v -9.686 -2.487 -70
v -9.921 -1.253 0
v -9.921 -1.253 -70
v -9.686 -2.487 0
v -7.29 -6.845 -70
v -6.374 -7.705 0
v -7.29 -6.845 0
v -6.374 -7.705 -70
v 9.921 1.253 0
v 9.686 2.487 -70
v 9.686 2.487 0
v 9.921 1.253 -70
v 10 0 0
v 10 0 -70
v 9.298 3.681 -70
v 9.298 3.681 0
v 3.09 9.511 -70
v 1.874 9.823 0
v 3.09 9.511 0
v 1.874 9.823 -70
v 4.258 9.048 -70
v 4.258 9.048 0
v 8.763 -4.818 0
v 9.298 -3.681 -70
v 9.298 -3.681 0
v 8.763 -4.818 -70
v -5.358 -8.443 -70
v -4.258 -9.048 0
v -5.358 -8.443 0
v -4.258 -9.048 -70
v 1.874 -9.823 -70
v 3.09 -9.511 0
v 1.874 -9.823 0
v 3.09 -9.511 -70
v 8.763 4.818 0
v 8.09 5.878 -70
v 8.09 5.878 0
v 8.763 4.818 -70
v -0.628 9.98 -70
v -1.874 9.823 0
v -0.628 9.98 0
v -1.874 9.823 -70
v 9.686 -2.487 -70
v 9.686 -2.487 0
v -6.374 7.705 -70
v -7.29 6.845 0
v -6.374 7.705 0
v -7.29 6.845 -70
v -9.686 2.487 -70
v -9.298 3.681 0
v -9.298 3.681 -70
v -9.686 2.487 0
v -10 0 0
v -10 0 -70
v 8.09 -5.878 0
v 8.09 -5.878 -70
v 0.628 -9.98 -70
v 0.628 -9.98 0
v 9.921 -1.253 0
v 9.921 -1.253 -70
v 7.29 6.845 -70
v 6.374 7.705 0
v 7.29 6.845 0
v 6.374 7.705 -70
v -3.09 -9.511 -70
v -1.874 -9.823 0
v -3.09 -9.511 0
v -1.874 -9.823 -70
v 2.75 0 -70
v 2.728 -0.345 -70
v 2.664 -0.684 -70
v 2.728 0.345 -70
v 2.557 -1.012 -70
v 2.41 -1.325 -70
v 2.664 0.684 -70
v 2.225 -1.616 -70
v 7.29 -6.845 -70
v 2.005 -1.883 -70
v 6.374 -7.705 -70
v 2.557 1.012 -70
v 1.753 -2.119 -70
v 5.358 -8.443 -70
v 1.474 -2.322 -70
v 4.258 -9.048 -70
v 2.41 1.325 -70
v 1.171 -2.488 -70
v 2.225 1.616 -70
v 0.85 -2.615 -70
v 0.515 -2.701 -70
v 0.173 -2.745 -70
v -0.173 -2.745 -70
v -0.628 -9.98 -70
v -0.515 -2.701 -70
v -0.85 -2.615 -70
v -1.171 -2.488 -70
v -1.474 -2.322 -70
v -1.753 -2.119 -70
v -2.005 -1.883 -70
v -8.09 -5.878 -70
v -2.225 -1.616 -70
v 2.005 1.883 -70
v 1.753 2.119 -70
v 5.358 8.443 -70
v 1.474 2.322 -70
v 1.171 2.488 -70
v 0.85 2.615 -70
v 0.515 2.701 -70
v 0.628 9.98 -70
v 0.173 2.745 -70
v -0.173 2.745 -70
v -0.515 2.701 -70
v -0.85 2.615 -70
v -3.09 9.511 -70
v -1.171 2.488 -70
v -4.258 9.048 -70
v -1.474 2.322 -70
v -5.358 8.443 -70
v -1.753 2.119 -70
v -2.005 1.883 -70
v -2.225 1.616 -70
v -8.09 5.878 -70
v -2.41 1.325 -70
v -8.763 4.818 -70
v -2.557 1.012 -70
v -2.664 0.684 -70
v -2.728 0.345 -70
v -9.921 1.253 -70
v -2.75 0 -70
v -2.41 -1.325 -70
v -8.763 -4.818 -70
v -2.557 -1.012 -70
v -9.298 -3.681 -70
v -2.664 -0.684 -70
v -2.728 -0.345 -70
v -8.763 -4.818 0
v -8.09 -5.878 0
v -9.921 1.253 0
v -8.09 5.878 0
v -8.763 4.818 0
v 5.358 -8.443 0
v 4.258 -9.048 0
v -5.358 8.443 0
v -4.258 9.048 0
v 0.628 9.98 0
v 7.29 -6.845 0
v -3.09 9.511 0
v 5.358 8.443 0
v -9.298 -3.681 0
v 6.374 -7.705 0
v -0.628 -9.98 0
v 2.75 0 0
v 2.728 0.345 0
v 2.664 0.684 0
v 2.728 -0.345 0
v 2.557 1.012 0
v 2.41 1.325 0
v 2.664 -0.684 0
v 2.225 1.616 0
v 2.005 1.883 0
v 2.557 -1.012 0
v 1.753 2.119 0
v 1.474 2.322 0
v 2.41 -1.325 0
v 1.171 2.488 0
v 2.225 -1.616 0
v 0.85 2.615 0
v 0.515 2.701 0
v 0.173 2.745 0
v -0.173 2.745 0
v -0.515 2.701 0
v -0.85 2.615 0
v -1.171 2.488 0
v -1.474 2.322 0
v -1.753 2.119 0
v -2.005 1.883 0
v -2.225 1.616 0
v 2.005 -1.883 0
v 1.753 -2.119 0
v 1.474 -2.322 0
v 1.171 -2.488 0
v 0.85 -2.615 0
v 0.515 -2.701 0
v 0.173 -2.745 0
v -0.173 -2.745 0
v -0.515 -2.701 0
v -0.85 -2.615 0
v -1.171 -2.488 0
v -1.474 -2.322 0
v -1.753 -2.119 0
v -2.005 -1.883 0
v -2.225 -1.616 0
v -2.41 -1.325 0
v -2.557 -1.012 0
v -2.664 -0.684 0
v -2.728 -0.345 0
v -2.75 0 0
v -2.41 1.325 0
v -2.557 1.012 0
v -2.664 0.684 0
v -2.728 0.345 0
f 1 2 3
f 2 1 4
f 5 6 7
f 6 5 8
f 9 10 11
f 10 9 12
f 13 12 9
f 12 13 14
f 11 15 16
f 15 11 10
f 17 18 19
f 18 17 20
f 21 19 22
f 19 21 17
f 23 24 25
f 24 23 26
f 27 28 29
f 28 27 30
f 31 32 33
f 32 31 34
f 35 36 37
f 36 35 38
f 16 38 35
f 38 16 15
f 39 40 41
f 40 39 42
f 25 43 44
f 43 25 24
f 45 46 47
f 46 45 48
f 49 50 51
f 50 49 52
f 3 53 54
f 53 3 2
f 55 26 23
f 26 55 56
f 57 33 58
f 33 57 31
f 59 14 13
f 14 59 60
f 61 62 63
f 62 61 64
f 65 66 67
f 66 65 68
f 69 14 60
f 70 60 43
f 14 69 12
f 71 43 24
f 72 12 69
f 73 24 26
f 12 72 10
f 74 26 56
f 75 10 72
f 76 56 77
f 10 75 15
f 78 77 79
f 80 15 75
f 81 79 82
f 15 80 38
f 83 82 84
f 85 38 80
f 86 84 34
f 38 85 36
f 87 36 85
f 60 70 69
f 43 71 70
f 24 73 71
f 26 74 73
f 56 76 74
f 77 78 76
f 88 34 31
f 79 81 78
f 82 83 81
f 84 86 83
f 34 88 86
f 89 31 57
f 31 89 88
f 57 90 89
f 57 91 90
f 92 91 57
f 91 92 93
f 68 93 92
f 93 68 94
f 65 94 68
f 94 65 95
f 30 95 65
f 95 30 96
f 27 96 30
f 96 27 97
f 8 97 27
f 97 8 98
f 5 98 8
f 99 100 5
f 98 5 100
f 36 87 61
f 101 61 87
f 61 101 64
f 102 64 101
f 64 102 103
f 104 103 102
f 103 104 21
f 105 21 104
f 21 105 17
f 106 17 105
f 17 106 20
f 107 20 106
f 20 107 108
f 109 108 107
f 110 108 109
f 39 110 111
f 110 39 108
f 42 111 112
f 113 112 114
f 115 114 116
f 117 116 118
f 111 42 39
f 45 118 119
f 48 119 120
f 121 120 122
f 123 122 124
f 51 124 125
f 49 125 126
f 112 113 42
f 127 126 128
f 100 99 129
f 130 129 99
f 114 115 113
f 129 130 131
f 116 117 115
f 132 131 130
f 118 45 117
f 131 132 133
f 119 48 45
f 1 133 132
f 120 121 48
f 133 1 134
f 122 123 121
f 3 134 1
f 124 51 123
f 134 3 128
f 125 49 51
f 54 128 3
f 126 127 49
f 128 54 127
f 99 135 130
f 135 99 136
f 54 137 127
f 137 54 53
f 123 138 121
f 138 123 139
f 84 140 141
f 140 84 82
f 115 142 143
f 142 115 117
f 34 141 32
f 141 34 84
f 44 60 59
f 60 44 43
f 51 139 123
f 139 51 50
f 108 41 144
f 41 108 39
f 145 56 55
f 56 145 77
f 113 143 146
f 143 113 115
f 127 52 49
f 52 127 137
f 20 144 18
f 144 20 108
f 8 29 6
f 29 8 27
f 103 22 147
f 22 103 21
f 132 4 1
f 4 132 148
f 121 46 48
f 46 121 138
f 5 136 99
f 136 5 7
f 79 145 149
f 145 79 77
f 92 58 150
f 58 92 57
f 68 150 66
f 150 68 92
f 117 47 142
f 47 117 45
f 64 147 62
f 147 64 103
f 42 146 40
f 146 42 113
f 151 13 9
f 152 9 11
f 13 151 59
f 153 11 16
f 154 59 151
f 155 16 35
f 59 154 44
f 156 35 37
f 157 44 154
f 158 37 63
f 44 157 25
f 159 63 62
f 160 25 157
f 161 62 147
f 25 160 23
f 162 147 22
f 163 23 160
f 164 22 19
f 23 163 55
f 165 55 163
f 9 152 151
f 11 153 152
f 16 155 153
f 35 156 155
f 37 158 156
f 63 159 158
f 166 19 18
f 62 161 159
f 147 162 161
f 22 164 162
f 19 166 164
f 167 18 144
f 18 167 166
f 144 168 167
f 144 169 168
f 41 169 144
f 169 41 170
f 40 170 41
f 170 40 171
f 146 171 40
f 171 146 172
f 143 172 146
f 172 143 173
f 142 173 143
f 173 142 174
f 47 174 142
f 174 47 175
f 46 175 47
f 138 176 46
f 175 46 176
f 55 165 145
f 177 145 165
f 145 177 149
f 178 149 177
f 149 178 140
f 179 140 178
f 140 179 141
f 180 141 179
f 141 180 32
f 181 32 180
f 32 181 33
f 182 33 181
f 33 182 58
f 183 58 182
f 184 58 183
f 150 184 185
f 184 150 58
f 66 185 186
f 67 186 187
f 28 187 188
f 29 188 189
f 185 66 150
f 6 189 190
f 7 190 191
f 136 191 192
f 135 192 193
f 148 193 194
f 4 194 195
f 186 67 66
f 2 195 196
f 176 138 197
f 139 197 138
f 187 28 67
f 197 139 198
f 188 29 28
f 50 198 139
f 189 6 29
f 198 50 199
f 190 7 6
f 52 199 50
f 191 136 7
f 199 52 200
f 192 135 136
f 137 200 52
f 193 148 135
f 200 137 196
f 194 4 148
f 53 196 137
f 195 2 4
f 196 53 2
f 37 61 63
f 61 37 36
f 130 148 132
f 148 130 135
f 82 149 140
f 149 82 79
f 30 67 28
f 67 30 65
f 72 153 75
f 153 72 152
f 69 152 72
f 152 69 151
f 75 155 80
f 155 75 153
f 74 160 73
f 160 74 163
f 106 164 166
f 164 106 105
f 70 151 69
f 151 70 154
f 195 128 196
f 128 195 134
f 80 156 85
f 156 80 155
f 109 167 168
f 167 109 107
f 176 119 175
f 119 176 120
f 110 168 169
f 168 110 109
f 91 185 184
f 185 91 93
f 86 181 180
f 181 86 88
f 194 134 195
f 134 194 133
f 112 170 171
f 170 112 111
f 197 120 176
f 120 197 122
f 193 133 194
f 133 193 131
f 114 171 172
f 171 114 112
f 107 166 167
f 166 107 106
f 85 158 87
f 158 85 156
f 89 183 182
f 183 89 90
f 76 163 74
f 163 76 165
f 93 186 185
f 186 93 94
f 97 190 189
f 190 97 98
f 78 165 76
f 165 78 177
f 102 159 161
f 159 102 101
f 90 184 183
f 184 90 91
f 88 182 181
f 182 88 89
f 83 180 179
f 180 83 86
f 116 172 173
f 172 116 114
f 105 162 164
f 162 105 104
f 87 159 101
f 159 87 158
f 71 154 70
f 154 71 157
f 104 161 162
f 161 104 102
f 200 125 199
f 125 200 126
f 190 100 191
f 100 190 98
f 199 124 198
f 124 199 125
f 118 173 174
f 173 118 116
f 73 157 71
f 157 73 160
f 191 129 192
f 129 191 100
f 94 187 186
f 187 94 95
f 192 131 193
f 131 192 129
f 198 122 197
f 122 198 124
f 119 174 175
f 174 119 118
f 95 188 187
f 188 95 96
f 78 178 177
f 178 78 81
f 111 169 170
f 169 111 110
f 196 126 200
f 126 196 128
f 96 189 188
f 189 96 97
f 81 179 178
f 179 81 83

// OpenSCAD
$fn = 50;


difference() {
	union() {
		translate(v = [0, 0, -70.0000000000]) {
			cylinder(h = 70, r = 10.0000000000);
		}
		cylinder(h = 0, r = 16.0000000000);
	}
	union() {
		#translate(v = [0, 0, -70]) {
			cylinder(h = 70, r = 2.7500000000);
		}
	}
}
